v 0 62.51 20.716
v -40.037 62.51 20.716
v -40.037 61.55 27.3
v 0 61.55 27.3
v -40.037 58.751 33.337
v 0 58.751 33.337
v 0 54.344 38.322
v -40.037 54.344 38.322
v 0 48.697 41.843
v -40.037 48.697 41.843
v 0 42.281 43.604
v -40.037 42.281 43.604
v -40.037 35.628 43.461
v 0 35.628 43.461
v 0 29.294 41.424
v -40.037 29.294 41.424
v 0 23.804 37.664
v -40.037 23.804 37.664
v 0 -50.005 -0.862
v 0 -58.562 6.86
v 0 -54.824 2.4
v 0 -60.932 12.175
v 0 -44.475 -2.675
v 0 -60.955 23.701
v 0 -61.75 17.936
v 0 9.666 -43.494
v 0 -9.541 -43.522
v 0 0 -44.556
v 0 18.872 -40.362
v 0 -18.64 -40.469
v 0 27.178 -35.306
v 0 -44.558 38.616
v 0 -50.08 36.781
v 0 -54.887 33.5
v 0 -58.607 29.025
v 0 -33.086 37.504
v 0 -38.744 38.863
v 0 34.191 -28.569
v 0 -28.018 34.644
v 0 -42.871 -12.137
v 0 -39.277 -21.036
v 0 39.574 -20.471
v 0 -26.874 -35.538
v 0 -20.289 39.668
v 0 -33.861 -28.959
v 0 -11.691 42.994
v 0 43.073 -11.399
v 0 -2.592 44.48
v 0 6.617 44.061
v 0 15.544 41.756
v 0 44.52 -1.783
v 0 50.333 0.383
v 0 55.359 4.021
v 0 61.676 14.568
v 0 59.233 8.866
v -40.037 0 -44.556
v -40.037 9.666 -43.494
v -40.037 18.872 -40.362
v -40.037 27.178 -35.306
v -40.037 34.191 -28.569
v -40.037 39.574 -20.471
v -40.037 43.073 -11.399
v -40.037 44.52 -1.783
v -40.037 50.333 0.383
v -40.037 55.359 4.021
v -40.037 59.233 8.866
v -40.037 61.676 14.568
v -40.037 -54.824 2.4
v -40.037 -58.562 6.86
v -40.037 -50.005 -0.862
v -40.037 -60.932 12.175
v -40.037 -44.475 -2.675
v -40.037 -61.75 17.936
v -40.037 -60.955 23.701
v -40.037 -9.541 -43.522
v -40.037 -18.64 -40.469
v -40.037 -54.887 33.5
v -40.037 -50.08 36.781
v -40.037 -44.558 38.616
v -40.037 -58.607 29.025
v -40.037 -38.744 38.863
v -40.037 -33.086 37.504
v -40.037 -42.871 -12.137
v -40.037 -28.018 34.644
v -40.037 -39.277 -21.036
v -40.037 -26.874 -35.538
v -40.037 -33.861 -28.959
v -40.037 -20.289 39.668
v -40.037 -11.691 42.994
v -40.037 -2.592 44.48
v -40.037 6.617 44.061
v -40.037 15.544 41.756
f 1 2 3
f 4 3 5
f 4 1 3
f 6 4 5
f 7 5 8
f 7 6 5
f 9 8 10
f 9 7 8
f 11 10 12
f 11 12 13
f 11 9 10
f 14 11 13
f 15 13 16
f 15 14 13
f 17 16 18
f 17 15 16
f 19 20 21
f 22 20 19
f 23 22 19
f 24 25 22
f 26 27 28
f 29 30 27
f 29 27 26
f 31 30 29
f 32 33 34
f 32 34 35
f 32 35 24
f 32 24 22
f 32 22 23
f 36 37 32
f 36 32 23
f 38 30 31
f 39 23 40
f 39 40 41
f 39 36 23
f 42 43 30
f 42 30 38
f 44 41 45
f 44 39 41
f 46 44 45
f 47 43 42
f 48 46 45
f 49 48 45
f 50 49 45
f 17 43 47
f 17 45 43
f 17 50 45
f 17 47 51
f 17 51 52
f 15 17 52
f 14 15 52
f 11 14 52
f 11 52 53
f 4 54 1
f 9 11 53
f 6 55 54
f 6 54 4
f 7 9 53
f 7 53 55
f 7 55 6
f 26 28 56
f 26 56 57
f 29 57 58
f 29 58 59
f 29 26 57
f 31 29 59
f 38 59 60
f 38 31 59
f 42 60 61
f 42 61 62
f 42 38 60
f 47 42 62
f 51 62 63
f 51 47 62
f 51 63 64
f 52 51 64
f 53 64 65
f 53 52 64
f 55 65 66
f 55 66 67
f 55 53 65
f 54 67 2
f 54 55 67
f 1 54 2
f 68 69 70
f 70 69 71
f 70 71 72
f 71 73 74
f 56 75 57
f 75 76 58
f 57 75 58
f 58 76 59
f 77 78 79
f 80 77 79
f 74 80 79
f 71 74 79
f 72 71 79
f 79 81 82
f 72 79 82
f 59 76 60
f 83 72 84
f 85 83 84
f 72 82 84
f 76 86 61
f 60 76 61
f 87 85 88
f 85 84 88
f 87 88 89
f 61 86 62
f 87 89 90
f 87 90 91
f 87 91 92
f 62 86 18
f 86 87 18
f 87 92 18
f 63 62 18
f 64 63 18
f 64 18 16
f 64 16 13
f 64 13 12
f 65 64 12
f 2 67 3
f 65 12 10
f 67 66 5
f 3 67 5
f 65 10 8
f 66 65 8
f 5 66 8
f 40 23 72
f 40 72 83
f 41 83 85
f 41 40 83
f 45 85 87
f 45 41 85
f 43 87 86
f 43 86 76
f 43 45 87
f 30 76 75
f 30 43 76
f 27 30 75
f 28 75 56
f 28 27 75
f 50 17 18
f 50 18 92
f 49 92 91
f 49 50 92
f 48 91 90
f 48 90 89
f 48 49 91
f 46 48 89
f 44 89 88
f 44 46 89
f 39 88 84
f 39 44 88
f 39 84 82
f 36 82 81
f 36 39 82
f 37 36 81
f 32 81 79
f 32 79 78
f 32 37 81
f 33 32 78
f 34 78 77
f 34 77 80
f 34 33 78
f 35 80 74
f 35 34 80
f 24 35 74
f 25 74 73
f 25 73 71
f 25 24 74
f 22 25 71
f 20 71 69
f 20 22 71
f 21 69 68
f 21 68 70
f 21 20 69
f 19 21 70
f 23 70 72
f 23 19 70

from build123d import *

# Parameters (mm, degrees)
F1_DEPTH = 40.03749


with BuildPart() as f1:
    # F0 (on Right) → F1 (new body)
    with BuildSketch(Plane.YZ):
        with BuildLine():
            ThreePointArc((44.5198227701, -1.7826942255), (44.5465801188, -0.8915256021), (44.5555004257, 0))
            ThreePointArc((44.5555004257, 0), (43.3760301156, 10.1839397872), (39.9000649082, 19.8287023908))
            Line((39.9000649082, 19.8287023908), (16.4275774694, 19.2902224238))
            ThreePointArc((16.4275774694, 19.2902224238), (25.6072357444, 2.2662942698), (44.5198227701, -1.7826942255))
        make_face()
        with BuildLine():
            ThreePointArc((39.9000649082, 19.8287023908), (43.3760301156, 10.1839397872), (44.5555004257, 0))
            ThreePointArc((44.5555004257, 0), (44.5465801188, -0.8915256021), (44.5198227701, -1.7826942255))
            ThreePointArc((44.5198227701, -1.7826942255), (57.4595301276, 6.3123736108), (62.5101083198, 20.7157693803))
            ThreePointArc((62.5101083198, 20.7157693803), (48.6974420854, 41.8425767898), (23.8043112787, 37.6636082011))
            ThreePointArc((23.8043112787, 37.6636082011), (33.0769232647, 29.8514616983), (39.9000649082, 19.8287023908))
        make_face()
        with BuildLine():
            Line((16.4275774694, 19.2902224238), (39.9000649082, 19.8287023908))
            ThreePointArc((39.9000649082, 19.8287023908), (33.0769232647, 29.8514616983), (23.8043112787, 37.6636082011))
            ThreePointArc((23.8043112787, 37.6636082011), (18.0440587641, 29.3087570216), (16.4275774694, 19.2902224238))
        make_face()
        with BuildLine():
            ThreePointArc((0, -44.5555004257), (30.8687850819, -32.1295926795), (44.5198227701, -1.7826942255))
            ThreePointArc((44.5198227701, -1.7826942255), (25.6072357444, 2.2662942698), (16.4275774694, 19.2902224238))
            Line((16.4275774694, 19.2902224238), (0, 18.9133590259))
            Line((0, 18.9133590259), (0, -44.5555004257))
        make_face()
        with BuildLine():
            ThreePointArc((16.4275774694, 19.2902224238), (18.0440587641, 29.3087570216), (23.8043112787, 37.6636082011))
            ThreePointArc((23.8043112787, 37.6636082011), (-2.5921293007, 44.4800346658), (-28.0181032693, 34.6435925876))
            ThreePointArc((-28.0181032693, 34.6435925876), (-22.0629919245, 27.4874750802), (-19.7900024173, 18.4593585764))
            Line((-19.7900024173, 18.4593585764), (0, 18.9133590259))
            Line((0, 18.9133590259), (16.4275774694, 19.2902224238))
        make_face()
        with BuildLine():
            ThreePointArc((-44.4751519011, -2.6745993272), (-30.5452492764, -32.4373298041), (0, -44.5555004257))
            Line((0, -44.5555004257), (0, 18.9133590259))
            Line((0, 18.9133590259), (-19.7900024173, 18.4593585764))
            ThreePointArc((-19.7900024173, 18.4593585764), (-19.7858629772, 18.2187543647), (-19.7844831034, 17.9781185038))
            ThreePointArc((-19.7844831034, 17.9781185038), (-27.304798405, 1.8833687428), (-44.4751519011, -2.6745993272))
        make_face()
        with BuildLine():
            ThreePointArc((-19.7900024173, 18.4593585764), (-22.0629919245, 27.4874750802), (-28.0181032693, 34.6435925876))
            ThreePointArc((-28.0181032693, 34.6435925876), (-35.3877865562, 27.0720738186), (-40.7673873733, 17.9781185038))
            Line((-40.7673873733, 17.9781185038), (-19.7900024173, 18.4593585764))
        make_face()
        with BuildLine():
            ThreePointArc((-40.7673873733, 17.9781185038), (-35.3877865562, 27.0720738186), (-28.0181032693, 34.6435925876))
            ThreePointArc((-28.0181032693, 34.6435925876), (-59.9663230472, 26.444708171), (-44.4751519011, -2.6745993272))
            ThreePointArc((-44.4751519011, -2.6745993272), (-43.8543762233, 7.8731381447), (-40.7673873733, 17.9781185038))
        make_face()
        with BuildLine():
            ThreePointArc((-40.7673873733, 17.9781185038), (-43.8543762233, 7.8731381447), (-44.4751519011, -2.6745993272))
            ThreePointArc((-44.4751519011, -2.6745993272), (-27.304798405, 1.8833687428), (-19.7844831034, 17.9781185038))
            ThreePointArc((-19.7844831034, 17.9781185038), (-19.7858629772, 18.2187543647), (-19.7900024173, 18.4593585764))
            Line((-19.7900024173, 18.4593585764), (-40.7673873733, 17.9781185038))
        make_face()
    extrude(amount=-F1_DEPTH)


solid = f1.part
